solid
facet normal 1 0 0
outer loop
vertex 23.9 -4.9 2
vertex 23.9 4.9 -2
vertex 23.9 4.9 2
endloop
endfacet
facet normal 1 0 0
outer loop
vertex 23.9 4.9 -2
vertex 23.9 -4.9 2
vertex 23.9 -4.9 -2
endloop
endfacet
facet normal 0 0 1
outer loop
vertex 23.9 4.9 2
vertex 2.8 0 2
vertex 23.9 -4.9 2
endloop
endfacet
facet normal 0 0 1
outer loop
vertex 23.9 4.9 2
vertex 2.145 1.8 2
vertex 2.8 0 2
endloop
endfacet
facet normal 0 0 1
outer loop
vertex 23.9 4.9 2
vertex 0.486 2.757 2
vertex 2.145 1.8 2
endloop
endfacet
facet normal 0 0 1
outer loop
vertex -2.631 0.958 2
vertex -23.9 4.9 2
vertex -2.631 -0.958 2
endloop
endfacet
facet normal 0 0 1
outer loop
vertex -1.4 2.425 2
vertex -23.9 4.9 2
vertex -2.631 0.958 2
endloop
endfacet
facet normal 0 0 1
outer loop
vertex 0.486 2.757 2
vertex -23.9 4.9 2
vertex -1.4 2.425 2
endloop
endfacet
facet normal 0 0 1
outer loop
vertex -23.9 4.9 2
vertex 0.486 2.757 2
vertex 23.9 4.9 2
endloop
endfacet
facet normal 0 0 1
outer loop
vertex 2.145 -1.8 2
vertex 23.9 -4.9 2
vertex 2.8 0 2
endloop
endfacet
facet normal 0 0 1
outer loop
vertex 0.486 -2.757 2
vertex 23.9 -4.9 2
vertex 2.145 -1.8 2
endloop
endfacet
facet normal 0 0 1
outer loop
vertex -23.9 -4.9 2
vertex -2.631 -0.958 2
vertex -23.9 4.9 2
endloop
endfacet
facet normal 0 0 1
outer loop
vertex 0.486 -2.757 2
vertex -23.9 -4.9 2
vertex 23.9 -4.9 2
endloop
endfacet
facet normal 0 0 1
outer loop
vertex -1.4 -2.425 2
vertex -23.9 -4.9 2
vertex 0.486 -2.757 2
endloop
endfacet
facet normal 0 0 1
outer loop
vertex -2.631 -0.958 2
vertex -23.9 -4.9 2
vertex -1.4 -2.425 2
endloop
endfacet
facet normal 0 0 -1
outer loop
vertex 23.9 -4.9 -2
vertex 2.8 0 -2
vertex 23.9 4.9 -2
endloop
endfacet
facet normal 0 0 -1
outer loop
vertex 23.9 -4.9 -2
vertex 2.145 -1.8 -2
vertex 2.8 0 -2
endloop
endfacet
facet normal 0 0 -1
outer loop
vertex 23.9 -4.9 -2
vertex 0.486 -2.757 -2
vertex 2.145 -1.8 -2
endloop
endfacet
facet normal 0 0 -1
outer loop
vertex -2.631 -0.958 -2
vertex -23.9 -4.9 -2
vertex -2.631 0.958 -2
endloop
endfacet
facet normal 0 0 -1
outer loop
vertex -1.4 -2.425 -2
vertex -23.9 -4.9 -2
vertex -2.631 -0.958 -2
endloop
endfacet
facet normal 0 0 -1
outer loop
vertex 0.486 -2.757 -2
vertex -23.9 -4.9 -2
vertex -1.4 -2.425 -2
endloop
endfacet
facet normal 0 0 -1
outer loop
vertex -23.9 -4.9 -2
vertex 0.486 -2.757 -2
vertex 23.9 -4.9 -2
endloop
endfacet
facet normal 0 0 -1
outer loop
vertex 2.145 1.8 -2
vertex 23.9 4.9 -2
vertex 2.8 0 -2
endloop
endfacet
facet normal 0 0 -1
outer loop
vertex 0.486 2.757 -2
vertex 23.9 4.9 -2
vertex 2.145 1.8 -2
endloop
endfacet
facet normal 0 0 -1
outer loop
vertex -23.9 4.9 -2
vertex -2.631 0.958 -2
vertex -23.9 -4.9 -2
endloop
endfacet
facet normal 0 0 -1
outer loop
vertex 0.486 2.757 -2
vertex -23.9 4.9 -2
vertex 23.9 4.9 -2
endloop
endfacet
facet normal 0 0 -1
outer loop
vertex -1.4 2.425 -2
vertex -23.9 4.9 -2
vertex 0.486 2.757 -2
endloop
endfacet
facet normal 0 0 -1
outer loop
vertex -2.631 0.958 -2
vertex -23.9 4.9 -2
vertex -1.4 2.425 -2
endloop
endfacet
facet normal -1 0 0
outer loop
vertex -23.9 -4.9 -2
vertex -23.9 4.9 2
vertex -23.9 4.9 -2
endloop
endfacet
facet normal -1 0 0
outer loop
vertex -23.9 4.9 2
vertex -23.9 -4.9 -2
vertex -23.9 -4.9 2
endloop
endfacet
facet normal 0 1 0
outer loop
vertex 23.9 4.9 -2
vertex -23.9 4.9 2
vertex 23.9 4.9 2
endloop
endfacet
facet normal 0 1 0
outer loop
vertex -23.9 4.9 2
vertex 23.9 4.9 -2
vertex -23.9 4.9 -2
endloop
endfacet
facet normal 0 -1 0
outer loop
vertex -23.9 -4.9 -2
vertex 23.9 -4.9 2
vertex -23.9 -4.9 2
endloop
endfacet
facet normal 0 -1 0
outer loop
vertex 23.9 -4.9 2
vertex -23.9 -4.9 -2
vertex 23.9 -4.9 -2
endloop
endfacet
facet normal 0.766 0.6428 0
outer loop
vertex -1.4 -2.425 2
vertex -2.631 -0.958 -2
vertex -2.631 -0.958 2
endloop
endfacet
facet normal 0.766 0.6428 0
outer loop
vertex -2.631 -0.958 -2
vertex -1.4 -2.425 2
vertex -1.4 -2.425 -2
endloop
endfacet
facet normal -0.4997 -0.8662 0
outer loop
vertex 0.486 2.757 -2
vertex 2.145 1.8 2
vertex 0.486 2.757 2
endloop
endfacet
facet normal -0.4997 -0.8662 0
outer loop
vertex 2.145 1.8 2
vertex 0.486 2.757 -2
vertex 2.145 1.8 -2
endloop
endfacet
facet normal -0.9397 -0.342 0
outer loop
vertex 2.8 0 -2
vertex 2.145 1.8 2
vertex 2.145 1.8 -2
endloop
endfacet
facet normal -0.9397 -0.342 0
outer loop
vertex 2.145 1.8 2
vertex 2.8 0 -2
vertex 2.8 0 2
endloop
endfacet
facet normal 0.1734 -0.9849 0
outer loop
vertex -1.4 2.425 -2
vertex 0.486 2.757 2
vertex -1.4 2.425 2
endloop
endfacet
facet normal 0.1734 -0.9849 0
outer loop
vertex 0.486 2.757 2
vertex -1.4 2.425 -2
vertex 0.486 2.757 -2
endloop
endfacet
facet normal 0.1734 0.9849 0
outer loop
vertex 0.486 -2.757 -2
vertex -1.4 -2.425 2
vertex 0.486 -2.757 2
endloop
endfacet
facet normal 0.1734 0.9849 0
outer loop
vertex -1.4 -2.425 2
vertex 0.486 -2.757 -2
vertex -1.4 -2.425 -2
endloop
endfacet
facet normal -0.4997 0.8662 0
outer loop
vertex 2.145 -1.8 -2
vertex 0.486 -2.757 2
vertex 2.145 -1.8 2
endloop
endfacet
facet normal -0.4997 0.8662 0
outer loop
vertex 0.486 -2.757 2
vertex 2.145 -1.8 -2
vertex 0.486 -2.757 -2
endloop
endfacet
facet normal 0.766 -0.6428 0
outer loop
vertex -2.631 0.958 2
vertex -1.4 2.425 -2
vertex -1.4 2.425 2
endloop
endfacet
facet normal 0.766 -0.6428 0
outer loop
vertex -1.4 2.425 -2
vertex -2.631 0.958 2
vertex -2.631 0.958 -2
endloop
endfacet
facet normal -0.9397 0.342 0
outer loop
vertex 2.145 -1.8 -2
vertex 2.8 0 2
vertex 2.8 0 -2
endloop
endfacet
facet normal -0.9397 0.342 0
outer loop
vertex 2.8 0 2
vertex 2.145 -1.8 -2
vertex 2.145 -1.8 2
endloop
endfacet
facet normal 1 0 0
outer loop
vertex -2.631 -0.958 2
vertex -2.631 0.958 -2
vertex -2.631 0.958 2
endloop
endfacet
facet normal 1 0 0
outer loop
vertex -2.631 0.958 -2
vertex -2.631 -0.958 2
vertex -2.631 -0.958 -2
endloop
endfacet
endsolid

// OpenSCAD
// This file is licensed under CC0 1.0 Universal.
// See https://creativecommons.org/publicdomain/zero/1.0/
playseat_stand_breite      = 55;
playseat_stand_wandstaerke = 2.6;

threaded_insert_d3         = 5.6;
threaded_insert_w          = 2.1;
threaded_insert_l          = 4.0;

difference() {
    cube([
            playseat_stand_breite - playseat_stand_wandstaerke * 2 - 2,
            threaded_insert_d3 + threaded_insert_w * 2,
            threaded_insert_l
        ],
        center = true
    );

    cylinder(
        d = threaded_insert_d3,
        h = threaded_insert_l + 1.1,
        center = true
    );
}
